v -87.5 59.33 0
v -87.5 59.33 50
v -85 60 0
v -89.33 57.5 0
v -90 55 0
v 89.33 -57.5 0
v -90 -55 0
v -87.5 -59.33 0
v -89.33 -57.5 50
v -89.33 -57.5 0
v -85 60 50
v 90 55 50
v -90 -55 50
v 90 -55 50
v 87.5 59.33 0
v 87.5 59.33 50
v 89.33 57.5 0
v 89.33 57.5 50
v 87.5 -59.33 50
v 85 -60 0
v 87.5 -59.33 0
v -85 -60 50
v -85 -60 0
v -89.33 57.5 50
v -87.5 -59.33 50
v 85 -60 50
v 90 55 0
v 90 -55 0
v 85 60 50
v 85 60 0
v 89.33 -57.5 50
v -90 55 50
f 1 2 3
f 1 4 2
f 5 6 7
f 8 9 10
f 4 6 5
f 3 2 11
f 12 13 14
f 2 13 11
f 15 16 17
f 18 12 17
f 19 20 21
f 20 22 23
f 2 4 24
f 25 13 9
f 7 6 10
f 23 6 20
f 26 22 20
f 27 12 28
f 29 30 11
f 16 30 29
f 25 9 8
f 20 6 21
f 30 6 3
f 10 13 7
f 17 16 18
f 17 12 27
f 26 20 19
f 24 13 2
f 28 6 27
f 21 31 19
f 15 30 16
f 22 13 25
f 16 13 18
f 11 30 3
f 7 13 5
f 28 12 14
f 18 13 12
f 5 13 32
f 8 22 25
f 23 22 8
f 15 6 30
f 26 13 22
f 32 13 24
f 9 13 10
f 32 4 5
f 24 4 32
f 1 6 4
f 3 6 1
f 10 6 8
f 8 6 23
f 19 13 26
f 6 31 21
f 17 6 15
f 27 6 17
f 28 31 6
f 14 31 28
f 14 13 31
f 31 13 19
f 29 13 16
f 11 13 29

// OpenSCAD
$fn = 12;

// outside dimensions for enclosure box
width = 180;
length = 120;
height = 50;

corner_radius = 5;
wall_thickness = 4;
post_diameter = 10;
hole_diameter = 3;
lid_thickness = 2;
lid_lip = 2;
lid_tolerance = .5;

module posts(x, y, z, h, r)
{
	translate([ x, y, z ])
	{
		cylinder(r = r, h = h);
	}
	translate([ -x, y, z ])
	{
		cylinder(r = r, h = h);
	}
	translate([ -x, -y, z ])
	{
		cylinder(r = r, h = h);
	}
	translate([ x, -y, z ])
	{
		cylinder(r = r, h = h);
	}
}

difference()
{
	// box
	!hull()
	{
		posts(x = (width / 2 - corner_radius), y = (length / 2 - corner_radius), z = 0, h = height, r = corner_radius);
	}
	// hollow
	hull()
	{
		posts(x = (width / 2 - corner_radius - wall_thickness), y = (length / 2 - corner_radius - wall_thickness),
		      z = wall_thickness, h = height, r = corner_radius);
	}
	// lip inside box
	hull()
	{
		posts(x = (width / 2 - corner_radius - lid_lip), y = (length / 2 - corner_radius - lid_lip),
		      z = (height - lid_thickness), h = lid_thickness + 1, r = corner_radius);
	}
}

difference()
{
	// support posts
	posts(x = (width / 2 - wall_thickness / 2 - post_diameter / 2),
	      y = (length / 2 - wall_thickness / 2 - post_diameter / 2), z = wall_thickness - .5,
	      h = height - wall_thickness - lid_thickness + .5, r = post_diameter / 2);
	// support post holes
	posts(x = (width / 2 - wall_thickness / 2 - post_diameter / 2),
	      y = (length / 2 - wall_thickness / 2 - post_diameter / 2), z = wall_thickness,
	      h = height - wall_thickness - lid_thickness + .5, r = hole_diameter / 2);
}

difference()
{
	// lid
	hull()
	{
		posts(x = (width / 2 - corner_radius - wall_thickness / 2 - lid_tolerance),
		      y = (length / 2 - corner_radius - wall_thickness / 2 - lid_tolerance), z = height - lid_thickness + 5,
		      h = lid_thickness, r = corner_radius);
	}
	// lid holes
	posts(x = (width / 2 - wall_thickness / 2 - post_diameter / 2),
	      y = (length / 2 - wall_thickness / 2 - post_diameter / 2), z = height - lid_thickness + .5,
	      h = height - wall_thickness - lid_thickness + 5, r = hole_diameter / 2 + .5);
}
